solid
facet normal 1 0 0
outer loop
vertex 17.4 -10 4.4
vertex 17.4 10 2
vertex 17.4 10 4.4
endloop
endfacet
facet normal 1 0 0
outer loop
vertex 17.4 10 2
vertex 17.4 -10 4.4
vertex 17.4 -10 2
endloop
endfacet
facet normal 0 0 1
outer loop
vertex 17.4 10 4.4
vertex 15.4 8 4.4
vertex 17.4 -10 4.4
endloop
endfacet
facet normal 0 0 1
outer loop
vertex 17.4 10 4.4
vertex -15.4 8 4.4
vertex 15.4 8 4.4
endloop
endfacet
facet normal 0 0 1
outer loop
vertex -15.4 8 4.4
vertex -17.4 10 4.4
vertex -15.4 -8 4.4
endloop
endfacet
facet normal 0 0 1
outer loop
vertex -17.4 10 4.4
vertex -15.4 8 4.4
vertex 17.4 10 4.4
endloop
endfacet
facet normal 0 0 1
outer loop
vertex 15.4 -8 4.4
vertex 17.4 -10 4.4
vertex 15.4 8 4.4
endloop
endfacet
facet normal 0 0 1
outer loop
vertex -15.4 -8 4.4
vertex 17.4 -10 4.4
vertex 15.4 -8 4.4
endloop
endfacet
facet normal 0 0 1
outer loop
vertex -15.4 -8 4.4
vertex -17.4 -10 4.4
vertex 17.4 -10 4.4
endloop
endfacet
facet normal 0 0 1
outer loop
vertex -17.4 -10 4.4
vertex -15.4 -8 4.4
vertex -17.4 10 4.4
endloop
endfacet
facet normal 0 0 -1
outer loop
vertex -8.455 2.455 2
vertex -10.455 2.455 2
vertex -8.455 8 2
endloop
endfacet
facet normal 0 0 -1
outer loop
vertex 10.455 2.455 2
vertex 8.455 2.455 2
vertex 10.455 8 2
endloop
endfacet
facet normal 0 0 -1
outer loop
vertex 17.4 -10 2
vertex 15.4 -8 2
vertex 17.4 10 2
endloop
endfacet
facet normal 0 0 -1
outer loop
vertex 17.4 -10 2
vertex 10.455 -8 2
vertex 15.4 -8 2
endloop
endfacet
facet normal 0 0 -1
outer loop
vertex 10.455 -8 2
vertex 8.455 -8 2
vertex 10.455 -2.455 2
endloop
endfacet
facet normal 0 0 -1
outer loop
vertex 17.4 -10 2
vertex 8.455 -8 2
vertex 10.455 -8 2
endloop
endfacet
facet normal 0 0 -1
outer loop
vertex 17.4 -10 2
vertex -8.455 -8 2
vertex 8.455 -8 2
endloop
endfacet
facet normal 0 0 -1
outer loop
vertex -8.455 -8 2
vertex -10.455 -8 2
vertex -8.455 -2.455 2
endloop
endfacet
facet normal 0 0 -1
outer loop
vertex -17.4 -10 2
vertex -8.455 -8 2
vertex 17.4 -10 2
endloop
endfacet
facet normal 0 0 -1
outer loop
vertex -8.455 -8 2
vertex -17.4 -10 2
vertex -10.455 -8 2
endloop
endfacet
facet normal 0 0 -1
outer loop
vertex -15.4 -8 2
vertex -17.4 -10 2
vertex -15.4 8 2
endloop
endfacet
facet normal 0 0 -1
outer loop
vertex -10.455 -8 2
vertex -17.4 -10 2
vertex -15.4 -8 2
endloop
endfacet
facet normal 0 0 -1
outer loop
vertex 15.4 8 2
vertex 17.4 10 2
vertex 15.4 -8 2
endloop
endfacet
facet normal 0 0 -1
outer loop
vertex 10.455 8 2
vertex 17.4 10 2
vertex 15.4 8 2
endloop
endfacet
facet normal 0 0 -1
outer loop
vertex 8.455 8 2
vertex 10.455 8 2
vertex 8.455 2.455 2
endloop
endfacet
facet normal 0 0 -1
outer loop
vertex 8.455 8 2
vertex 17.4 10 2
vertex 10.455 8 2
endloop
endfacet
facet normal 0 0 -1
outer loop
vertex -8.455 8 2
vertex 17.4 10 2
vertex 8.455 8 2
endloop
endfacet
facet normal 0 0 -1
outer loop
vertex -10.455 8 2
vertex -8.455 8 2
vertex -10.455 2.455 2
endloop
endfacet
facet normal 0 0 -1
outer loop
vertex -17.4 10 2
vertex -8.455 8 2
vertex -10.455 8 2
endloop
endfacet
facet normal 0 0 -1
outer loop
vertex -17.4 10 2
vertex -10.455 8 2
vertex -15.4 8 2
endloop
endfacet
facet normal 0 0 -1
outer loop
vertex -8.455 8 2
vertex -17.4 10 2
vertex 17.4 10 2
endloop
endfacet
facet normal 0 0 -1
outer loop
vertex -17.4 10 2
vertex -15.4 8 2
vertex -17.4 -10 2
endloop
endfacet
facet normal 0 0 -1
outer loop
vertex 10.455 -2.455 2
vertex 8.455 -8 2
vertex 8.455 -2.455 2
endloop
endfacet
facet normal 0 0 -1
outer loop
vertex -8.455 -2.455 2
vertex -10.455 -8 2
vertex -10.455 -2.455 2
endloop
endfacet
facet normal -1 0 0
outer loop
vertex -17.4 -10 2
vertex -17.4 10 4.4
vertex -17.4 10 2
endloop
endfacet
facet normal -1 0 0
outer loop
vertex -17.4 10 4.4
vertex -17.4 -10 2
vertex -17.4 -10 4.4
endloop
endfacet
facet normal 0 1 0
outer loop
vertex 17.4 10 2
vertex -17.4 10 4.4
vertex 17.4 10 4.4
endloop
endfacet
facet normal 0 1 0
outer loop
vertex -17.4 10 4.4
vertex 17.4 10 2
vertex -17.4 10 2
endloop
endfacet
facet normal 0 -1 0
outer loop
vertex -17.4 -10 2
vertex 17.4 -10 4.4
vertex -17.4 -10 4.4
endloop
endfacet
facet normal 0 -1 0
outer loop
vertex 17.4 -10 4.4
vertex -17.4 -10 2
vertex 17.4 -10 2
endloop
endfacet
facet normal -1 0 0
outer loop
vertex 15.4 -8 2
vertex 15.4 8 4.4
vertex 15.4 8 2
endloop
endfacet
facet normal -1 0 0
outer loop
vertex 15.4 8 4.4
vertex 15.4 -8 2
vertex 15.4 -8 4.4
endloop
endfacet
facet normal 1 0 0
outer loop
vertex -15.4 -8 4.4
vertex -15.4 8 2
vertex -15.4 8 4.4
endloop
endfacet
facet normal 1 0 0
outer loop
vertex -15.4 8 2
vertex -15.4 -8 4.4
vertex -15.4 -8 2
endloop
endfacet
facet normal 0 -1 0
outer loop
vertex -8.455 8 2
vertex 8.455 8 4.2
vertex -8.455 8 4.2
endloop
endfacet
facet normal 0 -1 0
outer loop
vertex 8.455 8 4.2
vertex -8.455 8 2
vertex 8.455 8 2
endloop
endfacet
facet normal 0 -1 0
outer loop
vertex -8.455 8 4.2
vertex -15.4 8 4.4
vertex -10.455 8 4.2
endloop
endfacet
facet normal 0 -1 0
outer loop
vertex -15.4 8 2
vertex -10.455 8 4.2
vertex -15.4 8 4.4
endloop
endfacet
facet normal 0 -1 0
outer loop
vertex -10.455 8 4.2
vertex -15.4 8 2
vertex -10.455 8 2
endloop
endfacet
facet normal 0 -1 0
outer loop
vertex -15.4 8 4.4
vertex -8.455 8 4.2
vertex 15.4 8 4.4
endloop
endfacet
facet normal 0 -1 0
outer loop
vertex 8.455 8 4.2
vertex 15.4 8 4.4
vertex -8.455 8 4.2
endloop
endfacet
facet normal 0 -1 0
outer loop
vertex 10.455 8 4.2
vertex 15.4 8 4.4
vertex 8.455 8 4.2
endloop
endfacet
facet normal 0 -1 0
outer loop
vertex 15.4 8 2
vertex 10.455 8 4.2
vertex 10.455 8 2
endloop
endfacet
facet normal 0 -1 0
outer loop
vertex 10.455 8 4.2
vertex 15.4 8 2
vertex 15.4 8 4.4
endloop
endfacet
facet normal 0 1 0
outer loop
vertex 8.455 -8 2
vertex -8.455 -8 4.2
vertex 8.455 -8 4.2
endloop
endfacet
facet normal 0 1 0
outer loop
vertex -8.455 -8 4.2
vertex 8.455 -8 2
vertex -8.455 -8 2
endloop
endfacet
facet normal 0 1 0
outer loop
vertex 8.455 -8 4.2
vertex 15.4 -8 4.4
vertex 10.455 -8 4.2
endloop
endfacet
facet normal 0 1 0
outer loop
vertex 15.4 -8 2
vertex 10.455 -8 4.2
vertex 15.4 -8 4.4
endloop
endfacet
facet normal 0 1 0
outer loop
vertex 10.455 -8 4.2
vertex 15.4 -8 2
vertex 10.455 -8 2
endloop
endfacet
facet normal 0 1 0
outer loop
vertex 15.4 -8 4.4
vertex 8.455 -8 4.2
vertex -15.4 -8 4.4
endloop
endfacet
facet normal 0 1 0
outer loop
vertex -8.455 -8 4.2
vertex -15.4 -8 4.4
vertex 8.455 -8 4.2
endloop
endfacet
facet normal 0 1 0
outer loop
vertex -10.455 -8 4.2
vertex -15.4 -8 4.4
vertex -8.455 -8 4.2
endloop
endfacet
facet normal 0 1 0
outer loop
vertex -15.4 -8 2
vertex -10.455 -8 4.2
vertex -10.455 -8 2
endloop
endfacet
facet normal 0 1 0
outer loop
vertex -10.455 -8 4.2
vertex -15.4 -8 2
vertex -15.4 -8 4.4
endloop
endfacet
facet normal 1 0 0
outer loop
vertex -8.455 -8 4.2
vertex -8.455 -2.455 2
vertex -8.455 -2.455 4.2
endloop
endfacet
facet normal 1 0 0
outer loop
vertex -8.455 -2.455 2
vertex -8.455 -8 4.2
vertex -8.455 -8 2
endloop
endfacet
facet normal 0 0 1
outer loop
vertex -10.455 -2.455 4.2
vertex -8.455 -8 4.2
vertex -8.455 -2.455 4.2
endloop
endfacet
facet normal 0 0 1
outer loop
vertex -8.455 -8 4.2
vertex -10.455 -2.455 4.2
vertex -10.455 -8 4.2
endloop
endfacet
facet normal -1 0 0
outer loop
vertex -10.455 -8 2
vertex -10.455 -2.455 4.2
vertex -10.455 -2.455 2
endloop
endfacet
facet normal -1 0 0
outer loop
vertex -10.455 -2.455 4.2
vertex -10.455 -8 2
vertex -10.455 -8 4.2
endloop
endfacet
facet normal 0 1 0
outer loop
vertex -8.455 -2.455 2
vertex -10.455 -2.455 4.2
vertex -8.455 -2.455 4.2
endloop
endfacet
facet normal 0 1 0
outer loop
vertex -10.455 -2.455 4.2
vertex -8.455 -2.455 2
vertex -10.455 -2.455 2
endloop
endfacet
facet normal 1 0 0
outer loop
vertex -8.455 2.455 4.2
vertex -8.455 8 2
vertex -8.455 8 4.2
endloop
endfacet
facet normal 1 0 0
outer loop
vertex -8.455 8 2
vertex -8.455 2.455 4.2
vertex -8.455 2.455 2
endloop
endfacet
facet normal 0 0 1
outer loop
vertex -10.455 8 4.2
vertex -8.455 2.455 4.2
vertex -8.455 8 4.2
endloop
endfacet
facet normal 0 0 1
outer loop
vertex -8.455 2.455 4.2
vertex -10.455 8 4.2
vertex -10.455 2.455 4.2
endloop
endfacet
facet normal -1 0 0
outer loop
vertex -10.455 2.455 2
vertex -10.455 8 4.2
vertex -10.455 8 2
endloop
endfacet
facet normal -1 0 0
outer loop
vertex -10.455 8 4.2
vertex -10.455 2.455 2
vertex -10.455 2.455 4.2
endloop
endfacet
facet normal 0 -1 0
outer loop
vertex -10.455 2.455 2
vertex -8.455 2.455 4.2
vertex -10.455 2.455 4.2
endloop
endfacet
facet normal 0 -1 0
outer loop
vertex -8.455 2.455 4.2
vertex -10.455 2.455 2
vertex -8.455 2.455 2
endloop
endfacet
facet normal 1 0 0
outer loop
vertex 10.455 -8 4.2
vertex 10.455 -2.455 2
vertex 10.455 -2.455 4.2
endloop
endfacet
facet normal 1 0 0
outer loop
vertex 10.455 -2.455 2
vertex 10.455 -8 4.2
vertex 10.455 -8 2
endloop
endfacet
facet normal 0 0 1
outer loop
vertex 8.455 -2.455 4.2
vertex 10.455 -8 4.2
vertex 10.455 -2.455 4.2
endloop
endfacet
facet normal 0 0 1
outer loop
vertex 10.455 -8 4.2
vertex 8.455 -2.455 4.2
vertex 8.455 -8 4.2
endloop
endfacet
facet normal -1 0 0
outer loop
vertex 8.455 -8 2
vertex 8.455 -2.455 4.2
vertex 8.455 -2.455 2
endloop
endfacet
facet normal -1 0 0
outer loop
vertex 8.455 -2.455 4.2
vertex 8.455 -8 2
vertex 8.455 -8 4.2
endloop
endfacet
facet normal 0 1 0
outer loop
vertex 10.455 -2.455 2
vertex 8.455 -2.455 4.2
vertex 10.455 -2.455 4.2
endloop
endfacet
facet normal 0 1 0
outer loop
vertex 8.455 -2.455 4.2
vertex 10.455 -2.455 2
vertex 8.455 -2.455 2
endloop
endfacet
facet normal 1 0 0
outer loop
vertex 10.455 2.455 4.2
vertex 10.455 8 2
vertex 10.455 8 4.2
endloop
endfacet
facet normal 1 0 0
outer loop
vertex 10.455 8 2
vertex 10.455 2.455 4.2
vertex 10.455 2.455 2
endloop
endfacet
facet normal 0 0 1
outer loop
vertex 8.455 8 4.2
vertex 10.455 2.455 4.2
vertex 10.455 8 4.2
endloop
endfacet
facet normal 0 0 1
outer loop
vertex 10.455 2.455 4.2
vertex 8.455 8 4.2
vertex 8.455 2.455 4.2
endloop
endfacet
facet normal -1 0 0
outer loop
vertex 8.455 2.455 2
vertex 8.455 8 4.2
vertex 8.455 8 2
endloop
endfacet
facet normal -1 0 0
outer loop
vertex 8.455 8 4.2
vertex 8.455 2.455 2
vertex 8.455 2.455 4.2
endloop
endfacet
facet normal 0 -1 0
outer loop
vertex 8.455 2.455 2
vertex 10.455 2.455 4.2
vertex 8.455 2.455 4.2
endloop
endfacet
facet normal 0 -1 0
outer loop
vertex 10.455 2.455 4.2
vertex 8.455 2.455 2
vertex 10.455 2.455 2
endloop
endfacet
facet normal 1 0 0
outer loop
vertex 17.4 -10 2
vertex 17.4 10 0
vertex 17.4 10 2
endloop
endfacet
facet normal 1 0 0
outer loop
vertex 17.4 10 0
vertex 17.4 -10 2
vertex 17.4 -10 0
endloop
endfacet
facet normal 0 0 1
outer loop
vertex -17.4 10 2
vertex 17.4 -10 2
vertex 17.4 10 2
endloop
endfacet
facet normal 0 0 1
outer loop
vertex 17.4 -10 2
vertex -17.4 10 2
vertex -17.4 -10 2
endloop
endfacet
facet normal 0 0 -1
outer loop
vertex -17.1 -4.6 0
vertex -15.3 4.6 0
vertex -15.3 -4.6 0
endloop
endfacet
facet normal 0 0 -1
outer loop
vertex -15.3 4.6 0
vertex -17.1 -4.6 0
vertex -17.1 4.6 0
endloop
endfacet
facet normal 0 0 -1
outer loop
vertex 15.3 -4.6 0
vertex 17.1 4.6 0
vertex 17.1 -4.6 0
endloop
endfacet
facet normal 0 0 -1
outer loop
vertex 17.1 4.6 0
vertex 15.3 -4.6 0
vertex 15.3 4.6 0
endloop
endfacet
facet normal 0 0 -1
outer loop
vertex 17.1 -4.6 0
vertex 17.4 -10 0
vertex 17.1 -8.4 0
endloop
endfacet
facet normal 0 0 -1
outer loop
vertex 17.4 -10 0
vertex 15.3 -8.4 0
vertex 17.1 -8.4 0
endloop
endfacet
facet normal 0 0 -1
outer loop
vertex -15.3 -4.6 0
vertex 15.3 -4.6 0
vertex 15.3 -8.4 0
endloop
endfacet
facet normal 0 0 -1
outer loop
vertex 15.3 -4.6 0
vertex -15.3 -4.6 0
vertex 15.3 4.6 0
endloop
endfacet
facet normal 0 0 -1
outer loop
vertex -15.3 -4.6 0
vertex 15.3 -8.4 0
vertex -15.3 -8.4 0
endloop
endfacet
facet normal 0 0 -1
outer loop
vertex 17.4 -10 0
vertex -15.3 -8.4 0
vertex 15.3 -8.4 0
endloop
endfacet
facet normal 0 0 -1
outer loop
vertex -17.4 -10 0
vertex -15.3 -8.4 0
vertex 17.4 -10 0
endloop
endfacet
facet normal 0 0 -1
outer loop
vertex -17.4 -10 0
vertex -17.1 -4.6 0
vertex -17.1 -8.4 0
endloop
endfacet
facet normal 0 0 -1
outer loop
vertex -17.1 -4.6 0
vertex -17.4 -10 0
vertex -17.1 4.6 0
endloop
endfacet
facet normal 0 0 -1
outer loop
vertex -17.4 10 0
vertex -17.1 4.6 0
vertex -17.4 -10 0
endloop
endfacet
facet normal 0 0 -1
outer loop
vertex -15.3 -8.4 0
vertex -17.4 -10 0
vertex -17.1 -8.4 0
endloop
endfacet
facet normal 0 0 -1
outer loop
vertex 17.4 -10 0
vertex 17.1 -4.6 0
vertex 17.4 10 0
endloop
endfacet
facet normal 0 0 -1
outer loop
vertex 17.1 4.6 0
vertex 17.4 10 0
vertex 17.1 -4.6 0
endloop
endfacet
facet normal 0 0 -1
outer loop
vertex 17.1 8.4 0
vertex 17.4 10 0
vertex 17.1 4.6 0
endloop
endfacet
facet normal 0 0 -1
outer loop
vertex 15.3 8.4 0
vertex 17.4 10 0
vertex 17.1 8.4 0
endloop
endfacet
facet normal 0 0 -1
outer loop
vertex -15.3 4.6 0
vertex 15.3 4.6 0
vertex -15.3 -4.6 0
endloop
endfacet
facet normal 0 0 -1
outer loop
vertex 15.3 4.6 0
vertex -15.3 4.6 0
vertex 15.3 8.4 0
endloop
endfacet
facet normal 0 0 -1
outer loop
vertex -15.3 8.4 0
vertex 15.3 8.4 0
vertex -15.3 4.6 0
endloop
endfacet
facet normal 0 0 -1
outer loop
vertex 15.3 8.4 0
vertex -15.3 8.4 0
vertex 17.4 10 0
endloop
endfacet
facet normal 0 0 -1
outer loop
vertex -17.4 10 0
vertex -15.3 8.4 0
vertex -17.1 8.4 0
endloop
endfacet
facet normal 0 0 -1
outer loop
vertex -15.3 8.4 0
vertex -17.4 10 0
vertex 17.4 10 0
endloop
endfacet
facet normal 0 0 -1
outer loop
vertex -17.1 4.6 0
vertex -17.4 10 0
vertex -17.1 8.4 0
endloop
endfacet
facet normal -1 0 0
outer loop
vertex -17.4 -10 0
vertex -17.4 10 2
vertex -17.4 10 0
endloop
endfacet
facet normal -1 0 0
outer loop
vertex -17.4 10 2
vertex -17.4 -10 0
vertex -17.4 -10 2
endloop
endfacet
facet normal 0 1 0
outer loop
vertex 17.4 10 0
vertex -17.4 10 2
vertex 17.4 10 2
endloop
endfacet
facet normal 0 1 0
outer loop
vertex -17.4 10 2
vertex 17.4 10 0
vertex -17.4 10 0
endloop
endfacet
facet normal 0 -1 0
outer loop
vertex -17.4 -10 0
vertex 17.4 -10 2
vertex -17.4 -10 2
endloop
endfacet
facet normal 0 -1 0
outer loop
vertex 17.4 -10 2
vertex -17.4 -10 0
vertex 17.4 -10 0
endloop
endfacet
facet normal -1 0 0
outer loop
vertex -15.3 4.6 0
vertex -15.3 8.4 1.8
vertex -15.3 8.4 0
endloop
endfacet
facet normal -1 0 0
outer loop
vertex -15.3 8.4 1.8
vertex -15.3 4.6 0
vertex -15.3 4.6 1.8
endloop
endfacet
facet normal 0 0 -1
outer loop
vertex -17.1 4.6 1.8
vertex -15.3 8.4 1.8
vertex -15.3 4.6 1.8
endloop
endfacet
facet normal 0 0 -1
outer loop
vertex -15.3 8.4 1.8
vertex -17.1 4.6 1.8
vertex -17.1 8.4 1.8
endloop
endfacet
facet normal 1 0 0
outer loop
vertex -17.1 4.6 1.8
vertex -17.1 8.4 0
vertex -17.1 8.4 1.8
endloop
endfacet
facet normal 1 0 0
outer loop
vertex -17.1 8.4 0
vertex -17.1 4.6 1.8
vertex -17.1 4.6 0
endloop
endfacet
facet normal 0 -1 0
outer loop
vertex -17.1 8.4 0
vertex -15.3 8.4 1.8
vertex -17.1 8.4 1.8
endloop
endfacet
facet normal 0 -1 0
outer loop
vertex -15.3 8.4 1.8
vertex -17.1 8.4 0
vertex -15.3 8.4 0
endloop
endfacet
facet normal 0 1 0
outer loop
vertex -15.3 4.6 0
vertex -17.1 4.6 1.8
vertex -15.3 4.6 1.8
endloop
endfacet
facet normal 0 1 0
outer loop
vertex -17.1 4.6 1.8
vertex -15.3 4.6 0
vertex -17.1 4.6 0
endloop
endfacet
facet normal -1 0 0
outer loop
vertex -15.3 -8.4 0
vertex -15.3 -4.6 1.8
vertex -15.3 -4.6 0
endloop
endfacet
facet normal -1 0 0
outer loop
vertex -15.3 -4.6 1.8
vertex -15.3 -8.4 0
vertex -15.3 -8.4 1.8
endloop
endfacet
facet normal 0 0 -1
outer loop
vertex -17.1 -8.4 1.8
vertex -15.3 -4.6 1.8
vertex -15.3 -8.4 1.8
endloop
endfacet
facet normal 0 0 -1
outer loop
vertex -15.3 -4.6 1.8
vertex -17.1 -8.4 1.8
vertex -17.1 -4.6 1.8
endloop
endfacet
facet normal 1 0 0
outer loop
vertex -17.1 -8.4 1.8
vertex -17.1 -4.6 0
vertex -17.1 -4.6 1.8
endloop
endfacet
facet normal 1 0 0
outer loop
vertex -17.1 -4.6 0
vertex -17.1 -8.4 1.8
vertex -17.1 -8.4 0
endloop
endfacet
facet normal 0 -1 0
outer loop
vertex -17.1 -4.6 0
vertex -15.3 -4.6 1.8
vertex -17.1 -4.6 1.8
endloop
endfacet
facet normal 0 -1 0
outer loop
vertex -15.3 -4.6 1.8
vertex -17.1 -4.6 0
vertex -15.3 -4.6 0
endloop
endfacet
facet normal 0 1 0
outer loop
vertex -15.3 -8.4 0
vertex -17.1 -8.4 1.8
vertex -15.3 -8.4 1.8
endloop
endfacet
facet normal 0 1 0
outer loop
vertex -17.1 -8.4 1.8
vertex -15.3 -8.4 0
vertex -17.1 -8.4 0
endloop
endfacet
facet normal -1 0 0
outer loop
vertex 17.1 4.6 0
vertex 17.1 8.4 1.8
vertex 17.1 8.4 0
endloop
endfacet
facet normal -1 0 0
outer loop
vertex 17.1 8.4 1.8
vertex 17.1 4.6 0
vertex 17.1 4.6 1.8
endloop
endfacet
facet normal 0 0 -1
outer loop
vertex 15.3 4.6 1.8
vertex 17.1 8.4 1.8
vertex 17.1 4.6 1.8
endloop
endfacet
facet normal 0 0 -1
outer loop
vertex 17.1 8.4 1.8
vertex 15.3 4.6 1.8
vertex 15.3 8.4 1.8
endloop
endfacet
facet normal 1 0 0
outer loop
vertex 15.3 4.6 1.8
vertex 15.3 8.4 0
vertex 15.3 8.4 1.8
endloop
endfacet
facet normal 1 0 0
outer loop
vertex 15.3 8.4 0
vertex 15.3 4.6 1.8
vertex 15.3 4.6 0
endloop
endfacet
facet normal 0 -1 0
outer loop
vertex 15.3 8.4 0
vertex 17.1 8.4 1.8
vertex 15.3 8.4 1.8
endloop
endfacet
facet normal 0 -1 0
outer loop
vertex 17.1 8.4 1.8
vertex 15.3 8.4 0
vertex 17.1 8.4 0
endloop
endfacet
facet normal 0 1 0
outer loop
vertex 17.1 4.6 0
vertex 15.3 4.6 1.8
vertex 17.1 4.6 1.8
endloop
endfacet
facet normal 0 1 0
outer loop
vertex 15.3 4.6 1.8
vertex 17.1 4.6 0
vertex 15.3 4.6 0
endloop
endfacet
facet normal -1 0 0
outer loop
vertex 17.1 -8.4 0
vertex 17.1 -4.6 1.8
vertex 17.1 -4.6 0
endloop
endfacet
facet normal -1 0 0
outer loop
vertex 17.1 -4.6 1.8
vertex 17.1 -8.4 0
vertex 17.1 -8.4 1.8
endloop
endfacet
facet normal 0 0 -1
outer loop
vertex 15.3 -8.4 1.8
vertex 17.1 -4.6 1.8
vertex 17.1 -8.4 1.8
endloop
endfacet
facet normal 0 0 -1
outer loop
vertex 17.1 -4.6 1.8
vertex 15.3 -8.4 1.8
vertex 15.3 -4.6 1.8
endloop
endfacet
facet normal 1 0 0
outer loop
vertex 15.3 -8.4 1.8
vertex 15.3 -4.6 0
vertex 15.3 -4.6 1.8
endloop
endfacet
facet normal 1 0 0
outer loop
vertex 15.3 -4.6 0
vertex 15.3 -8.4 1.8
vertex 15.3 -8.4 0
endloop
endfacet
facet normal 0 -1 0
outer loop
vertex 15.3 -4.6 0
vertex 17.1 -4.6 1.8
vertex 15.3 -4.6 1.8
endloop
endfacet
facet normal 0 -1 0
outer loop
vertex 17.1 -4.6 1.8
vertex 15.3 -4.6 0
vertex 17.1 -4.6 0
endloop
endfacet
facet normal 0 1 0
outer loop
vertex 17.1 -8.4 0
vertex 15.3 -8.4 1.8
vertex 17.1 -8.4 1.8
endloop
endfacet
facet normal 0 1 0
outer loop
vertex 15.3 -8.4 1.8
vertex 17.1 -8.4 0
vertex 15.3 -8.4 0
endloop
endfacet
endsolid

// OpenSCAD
// cradle print. Slab down, lip and corner blocks up; no overhangs.
include <model.scad>
view = "cradle_print";
